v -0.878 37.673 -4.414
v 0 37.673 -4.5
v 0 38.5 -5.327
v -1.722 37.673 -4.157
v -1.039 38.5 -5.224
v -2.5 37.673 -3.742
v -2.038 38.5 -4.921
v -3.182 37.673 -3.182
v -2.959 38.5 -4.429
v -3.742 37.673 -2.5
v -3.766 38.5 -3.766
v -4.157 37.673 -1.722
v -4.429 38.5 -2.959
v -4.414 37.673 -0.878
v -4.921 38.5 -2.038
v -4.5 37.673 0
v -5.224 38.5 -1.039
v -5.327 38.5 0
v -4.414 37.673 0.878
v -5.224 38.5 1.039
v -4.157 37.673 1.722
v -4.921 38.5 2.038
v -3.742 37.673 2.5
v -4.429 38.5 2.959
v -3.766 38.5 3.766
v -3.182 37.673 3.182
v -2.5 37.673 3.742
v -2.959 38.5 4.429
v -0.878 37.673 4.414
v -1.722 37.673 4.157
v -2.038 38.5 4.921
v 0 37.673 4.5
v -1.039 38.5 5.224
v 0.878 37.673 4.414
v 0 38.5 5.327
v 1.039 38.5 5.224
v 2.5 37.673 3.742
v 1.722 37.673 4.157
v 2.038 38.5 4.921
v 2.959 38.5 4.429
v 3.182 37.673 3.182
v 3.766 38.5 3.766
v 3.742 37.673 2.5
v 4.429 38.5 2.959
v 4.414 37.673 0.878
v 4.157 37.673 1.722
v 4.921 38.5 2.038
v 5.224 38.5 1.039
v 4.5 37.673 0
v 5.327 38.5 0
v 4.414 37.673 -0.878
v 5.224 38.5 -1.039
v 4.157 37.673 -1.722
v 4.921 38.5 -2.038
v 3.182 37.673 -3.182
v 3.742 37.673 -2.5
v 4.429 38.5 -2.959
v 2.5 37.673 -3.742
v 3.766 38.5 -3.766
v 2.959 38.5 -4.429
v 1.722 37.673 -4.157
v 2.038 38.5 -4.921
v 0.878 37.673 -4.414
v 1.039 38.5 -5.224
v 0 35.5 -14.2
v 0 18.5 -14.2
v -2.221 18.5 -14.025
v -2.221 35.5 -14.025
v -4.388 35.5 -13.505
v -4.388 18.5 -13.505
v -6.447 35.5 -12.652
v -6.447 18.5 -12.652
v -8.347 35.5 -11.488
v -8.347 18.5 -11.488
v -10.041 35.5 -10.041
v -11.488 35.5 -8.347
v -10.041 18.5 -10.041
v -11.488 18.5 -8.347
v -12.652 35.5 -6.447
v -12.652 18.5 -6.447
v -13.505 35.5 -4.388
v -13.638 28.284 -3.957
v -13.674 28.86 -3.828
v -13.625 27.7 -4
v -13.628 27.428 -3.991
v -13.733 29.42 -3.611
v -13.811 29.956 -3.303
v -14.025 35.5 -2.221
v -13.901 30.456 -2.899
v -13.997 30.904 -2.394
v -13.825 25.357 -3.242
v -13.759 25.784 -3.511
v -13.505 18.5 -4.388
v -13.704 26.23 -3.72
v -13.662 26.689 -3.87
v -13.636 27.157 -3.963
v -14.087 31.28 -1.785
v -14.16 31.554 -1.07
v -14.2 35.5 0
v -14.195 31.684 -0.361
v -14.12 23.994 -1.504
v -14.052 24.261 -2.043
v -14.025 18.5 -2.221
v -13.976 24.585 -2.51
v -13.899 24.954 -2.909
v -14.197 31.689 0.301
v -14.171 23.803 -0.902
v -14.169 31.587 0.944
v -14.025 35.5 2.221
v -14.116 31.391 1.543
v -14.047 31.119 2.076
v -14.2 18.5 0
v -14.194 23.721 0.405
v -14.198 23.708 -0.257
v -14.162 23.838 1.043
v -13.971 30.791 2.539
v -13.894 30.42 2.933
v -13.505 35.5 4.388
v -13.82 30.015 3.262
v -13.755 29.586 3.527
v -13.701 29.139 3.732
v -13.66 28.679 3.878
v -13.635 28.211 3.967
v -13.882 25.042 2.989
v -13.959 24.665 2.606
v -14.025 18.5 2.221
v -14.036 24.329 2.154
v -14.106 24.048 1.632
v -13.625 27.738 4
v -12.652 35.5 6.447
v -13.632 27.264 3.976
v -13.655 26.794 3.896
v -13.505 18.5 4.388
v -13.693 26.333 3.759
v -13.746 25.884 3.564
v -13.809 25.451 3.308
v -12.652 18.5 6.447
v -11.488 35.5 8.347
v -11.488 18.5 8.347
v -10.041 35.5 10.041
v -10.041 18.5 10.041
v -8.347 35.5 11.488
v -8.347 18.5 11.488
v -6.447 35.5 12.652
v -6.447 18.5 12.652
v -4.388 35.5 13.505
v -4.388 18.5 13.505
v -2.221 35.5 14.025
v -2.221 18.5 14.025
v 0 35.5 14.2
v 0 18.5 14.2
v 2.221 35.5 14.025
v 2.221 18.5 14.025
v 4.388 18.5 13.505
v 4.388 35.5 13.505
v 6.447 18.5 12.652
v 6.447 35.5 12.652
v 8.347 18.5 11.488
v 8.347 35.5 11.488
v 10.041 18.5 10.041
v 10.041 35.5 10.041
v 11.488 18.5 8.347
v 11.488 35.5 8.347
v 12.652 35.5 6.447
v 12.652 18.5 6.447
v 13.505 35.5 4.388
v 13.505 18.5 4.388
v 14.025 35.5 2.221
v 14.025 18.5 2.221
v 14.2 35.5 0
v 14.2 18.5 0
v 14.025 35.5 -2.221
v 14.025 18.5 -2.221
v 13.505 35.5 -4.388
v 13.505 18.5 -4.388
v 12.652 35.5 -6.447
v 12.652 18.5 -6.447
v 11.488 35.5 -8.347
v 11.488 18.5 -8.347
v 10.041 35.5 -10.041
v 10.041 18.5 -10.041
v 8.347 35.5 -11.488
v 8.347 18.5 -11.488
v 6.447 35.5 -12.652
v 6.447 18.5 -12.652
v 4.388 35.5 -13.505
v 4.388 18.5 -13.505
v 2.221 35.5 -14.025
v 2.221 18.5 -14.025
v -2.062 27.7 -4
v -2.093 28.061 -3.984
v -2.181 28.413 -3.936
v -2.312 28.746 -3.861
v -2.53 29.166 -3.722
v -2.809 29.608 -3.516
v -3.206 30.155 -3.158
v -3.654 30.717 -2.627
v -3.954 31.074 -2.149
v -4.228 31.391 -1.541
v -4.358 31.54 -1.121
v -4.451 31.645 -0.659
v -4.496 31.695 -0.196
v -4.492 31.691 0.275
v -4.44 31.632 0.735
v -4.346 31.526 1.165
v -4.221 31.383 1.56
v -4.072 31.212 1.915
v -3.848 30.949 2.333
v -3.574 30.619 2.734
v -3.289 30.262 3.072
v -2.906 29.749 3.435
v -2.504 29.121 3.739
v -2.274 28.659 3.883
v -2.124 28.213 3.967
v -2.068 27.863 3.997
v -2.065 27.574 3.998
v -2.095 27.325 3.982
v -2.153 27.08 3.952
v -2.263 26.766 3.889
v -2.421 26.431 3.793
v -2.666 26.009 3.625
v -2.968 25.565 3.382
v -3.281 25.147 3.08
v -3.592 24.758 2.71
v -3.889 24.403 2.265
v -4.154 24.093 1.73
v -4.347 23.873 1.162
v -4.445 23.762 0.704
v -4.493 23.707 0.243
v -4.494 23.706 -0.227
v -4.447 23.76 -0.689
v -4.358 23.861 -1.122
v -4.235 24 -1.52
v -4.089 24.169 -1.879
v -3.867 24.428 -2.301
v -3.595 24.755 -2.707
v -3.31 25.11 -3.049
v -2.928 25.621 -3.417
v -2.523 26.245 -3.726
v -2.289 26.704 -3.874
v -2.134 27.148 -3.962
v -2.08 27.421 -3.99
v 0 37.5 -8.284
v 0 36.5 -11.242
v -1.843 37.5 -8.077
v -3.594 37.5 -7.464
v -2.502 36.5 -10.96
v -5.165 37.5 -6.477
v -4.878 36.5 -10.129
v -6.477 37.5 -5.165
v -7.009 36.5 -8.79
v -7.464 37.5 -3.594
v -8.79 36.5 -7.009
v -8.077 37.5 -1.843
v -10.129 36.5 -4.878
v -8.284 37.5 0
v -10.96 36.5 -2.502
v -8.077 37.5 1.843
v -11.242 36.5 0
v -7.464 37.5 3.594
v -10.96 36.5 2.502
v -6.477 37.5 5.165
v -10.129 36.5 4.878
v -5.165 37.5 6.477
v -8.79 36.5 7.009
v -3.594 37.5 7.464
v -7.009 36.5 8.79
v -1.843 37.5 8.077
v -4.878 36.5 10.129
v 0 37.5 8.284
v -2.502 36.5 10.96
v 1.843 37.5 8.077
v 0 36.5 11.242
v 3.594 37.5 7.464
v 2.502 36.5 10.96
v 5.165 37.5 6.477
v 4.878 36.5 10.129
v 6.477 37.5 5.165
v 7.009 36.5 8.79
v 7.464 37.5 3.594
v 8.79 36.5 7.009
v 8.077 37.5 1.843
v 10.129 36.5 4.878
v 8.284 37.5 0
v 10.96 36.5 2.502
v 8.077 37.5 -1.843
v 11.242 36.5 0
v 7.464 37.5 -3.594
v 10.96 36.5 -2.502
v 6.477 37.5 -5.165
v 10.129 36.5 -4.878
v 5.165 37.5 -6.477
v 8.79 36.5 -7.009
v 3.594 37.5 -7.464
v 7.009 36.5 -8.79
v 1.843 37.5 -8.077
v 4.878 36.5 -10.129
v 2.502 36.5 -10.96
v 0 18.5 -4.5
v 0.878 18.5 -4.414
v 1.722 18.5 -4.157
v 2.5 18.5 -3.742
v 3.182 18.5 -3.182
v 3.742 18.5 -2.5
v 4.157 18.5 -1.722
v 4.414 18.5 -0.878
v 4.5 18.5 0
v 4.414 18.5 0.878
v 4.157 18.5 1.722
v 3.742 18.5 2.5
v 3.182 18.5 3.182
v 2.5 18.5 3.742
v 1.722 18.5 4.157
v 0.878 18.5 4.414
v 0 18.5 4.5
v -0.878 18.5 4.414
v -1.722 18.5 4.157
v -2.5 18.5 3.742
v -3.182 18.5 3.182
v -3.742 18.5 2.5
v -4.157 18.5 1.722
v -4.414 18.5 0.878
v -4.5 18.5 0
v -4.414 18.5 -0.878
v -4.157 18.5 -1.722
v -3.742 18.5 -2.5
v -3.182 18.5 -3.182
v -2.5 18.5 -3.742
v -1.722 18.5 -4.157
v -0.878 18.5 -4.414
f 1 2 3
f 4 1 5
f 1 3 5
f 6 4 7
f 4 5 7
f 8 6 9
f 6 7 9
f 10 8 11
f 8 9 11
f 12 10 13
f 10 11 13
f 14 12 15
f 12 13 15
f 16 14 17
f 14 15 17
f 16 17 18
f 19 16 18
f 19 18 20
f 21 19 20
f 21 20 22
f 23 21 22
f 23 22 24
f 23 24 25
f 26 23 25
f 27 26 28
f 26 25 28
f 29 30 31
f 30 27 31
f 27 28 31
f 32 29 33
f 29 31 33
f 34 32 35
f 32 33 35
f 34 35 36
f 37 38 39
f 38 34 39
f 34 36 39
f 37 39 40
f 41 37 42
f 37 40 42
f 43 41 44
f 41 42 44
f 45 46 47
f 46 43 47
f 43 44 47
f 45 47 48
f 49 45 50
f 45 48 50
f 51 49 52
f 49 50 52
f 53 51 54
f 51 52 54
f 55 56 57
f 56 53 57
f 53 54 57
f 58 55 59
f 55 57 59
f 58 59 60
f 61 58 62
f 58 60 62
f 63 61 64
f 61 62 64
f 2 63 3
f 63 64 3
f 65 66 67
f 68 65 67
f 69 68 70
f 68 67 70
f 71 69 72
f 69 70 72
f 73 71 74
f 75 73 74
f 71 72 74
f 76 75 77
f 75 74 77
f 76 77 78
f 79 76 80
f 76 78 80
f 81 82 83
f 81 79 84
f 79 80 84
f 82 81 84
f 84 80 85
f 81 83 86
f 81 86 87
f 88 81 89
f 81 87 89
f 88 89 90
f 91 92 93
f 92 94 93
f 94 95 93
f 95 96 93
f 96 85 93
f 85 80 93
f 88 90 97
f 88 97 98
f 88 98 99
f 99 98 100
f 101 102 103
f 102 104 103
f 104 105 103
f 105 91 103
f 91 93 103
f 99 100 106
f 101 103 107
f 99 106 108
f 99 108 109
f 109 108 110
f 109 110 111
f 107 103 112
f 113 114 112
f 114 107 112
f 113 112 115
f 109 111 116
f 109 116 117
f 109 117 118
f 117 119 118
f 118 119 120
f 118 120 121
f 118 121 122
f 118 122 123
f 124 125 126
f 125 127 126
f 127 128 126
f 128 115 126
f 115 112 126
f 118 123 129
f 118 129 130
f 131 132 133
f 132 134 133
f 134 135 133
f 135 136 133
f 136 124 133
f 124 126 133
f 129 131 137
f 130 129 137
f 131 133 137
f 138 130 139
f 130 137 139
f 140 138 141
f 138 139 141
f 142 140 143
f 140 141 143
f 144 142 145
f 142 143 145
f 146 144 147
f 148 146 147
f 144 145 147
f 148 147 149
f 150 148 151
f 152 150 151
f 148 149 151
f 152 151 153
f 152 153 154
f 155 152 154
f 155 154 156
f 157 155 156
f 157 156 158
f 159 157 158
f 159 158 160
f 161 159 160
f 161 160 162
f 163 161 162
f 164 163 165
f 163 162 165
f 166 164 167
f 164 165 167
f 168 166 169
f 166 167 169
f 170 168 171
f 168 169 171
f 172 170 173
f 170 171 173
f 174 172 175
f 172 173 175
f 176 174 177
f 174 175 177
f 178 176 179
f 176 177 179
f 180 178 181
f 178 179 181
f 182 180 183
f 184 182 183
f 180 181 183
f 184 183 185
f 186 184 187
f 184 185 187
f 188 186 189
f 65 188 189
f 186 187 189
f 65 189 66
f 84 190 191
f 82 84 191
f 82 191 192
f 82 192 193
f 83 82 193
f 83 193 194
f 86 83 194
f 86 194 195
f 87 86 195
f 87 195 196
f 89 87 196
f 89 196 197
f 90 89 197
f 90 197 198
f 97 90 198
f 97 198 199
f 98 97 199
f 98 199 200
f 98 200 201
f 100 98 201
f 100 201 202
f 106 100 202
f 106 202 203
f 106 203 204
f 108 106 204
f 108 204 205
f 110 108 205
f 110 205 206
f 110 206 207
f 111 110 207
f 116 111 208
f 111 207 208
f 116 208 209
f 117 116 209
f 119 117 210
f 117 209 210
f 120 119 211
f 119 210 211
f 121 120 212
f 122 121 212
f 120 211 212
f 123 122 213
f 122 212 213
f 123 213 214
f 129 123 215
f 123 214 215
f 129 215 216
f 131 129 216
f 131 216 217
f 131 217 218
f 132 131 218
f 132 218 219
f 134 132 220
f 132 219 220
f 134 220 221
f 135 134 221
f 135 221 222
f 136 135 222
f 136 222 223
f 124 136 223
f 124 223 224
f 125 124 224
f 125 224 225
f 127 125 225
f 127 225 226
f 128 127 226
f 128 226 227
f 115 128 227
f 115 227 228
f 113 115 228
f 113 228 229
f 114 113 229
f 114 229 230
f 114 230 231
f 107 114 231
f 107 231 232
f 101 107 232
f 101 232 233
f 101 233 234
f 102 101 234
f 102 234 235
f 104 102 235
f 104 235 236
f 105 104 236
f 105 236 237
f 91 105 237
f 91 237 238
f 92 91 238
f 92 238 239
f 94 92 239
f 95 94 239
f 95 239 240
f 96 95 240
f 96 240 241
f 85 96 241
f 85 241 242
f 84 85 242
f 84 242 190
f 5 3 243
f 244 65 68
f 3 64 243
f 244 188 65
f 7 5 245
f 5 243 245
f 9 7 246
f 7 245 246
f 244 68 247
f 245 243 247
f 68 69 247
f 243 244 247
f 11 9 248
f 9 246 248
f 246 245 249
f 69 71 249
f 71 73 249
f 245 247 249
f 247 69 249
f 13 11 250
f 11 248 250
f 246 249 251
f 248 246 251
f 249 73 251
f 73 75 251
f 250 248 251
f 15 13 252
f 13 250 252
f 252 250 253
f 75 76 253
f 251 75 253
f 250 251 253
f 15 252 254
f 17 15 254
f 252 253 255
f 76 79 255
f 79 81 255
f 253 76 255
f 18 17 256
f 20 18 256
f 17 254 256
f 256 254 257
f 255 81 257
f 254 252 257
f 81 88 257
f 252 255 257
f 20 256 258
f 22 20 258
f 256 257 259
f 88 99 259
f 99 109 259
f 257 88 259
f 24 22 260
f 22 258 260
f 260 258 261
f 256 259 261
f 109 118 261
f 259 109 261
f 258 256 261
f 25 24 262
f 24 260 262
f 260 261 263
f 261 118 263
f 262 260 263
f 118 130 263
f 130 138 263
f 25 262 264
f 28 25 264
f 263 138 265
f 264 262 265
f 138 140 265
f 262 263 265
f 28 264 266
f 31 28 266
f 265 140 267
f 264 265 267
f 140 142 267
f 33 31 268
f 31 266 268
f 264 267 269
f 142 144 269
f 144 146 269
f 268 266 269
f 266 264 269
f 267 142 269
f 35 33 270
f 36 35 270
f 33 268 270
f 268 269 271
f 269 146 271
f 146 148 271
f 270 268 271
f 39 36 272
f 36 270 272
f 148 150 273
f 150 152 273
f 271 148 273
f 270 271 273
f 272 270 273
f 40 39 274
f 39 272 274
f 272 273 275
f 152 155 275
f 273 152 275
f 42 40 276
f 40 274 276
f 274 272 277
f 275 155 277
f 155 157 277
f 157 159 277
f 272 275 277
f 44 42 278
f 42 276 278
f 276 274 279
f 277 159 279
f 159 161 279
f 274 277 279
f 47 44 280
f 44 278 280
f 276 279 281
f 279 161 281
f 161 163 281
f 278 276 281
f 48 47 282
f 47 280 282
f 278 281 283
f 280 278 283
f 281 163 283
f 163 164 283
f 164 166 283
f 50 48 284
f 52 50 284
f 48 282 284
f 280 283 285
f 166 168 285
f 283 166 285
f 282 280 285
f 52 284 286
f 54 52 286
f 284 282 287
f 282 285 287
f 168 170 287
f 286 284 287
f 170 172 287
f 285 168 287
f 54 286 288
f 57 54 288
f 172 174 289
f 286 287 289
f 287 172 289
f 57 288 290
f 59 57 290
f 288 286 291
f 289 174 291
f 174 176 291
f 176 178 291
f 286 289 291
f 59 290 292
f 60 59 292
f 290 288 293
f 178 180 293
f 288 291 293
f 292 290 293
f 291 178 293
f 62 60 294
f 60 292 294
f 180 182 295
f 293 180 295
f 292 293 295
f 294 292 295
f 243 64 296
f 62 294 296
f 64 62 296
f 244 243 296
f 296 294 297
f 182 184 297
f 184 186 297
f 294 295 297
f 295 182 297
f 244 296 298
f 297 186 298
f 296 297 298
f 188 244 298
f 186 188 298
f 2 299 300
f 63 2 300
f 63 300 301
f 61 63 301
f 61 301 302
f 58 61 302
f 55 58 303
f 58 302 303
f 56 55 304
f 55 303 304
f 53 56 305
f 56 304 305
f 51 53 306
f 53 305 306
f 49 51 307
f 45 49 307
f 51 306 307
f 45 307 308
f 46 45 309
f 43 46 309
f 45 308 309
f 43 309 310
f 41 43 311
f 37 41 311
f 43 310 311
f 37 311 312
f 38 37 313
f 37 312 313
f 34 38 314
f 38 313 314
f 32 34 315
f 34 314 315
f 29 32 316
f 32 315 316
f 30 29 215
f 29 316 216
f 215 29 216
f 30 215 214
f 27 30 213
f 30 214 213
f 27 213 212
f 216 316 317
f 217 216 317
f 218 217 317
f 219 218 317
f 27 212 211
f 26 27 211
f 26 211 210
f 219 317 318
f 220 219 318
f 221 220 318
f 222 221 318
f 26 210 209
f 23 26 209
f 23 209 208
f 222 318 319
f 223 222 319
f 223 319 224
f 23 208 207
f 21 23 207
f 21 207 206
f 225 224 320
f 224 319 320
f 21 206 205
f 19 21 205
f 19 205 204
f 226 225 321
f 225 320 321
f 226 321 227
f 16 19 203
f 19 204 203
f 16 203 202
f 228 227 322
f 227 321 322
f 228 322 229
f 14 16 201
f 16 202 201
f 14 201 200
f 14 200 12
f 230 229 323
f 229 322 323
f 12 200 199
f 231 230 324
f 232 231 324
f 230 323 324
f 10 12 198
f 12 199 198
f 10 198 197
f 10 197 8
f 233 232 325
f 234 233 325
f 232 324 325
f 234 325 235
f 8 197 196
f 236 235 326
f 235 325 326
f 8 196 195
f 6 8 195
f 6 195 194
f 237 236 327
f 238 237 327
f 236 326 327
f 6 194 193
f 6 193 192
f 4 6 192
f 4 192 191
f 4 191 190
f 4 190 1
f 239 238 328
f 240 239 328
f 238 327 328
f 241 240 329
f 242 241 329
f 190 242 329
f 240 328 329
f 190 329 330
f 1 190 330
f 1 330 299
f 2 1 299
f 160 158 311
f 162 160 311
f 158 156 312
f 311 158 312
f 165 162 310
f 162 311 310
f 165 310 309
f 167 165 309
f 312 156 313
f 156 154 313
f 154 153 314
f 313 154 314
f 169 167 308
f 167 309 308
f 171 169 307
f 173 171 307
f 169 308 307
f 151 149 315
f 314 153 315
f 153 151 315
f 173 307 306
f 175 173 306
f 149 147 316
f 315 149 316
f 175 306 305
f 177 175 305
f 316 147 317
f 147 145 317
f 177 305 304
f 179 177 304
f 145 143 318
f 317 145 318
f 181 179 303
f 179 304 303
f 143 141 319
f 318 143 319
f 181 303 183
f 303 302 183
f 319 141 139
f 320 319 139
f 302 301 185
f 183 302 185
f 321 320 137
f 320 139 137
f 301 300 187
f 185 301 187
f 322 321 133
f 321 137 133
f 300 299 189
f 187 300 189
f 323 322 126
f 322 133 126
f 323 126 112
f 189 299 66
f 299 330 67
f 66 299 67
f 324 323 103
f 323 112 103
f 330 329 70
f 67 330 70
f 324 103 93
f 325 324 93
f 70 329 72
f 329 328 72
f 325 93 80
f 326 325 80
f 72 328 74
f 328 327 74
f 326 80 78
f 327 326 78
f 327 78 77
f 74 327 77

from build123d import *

# Parameters (mm, degrees)
SKETCH3_R          = 4
CUT_EXTRUDE1_DEPTH = 22
SKETCH4_R          = 4.5
CUT_EXTRUDE2_DEPTH = 32


with BuildPart() as part:
    # Sketch2 → Revolve1 (revolve)
    with BuildSketch(Plane.XY, mode=Mode.PRIVATE) as revolve1_sk:
        Polygon((-14.2, 18.5), (-4, 18.5), (-4, 37.173414273), (-5.326585727, 38.5), (-14.2, 35.5), align=None)
    revolve(revolve1_sk.sketch.rotate(Axis((0, 15.2, 0), (0, 1, 0)), 270), axis=Axis((0, 15.2, 0), (0, 1, 0)))

    # Sketch3 → Cut-Extrude1 (cut)
    with BuildSketch(Plane(origin=(0, 0, 0), x_dir=(0, 0, -1), z_dir=(1, 0, 0))):
        with Locations((0, 27.7)):
            Circle(SKETCH3_R)
    extrude(amount=-CUT_EXTRUDE1_DEPTH, mode=Mode.SUBTRACT)

    # Sketch4 → Cut-Extrude2 (cut)
    with BuildSketch(Plane.XZ.offset(-18.5)):
        with Locations(Location((0, 0, 0), (0, 0, 270))):
            Circle(SKETCH4_R)
    extrude(amount=-CUT_EXTRUDE2_DEPTH, mode=Mode.SUBTRACT)


solid = part.part
